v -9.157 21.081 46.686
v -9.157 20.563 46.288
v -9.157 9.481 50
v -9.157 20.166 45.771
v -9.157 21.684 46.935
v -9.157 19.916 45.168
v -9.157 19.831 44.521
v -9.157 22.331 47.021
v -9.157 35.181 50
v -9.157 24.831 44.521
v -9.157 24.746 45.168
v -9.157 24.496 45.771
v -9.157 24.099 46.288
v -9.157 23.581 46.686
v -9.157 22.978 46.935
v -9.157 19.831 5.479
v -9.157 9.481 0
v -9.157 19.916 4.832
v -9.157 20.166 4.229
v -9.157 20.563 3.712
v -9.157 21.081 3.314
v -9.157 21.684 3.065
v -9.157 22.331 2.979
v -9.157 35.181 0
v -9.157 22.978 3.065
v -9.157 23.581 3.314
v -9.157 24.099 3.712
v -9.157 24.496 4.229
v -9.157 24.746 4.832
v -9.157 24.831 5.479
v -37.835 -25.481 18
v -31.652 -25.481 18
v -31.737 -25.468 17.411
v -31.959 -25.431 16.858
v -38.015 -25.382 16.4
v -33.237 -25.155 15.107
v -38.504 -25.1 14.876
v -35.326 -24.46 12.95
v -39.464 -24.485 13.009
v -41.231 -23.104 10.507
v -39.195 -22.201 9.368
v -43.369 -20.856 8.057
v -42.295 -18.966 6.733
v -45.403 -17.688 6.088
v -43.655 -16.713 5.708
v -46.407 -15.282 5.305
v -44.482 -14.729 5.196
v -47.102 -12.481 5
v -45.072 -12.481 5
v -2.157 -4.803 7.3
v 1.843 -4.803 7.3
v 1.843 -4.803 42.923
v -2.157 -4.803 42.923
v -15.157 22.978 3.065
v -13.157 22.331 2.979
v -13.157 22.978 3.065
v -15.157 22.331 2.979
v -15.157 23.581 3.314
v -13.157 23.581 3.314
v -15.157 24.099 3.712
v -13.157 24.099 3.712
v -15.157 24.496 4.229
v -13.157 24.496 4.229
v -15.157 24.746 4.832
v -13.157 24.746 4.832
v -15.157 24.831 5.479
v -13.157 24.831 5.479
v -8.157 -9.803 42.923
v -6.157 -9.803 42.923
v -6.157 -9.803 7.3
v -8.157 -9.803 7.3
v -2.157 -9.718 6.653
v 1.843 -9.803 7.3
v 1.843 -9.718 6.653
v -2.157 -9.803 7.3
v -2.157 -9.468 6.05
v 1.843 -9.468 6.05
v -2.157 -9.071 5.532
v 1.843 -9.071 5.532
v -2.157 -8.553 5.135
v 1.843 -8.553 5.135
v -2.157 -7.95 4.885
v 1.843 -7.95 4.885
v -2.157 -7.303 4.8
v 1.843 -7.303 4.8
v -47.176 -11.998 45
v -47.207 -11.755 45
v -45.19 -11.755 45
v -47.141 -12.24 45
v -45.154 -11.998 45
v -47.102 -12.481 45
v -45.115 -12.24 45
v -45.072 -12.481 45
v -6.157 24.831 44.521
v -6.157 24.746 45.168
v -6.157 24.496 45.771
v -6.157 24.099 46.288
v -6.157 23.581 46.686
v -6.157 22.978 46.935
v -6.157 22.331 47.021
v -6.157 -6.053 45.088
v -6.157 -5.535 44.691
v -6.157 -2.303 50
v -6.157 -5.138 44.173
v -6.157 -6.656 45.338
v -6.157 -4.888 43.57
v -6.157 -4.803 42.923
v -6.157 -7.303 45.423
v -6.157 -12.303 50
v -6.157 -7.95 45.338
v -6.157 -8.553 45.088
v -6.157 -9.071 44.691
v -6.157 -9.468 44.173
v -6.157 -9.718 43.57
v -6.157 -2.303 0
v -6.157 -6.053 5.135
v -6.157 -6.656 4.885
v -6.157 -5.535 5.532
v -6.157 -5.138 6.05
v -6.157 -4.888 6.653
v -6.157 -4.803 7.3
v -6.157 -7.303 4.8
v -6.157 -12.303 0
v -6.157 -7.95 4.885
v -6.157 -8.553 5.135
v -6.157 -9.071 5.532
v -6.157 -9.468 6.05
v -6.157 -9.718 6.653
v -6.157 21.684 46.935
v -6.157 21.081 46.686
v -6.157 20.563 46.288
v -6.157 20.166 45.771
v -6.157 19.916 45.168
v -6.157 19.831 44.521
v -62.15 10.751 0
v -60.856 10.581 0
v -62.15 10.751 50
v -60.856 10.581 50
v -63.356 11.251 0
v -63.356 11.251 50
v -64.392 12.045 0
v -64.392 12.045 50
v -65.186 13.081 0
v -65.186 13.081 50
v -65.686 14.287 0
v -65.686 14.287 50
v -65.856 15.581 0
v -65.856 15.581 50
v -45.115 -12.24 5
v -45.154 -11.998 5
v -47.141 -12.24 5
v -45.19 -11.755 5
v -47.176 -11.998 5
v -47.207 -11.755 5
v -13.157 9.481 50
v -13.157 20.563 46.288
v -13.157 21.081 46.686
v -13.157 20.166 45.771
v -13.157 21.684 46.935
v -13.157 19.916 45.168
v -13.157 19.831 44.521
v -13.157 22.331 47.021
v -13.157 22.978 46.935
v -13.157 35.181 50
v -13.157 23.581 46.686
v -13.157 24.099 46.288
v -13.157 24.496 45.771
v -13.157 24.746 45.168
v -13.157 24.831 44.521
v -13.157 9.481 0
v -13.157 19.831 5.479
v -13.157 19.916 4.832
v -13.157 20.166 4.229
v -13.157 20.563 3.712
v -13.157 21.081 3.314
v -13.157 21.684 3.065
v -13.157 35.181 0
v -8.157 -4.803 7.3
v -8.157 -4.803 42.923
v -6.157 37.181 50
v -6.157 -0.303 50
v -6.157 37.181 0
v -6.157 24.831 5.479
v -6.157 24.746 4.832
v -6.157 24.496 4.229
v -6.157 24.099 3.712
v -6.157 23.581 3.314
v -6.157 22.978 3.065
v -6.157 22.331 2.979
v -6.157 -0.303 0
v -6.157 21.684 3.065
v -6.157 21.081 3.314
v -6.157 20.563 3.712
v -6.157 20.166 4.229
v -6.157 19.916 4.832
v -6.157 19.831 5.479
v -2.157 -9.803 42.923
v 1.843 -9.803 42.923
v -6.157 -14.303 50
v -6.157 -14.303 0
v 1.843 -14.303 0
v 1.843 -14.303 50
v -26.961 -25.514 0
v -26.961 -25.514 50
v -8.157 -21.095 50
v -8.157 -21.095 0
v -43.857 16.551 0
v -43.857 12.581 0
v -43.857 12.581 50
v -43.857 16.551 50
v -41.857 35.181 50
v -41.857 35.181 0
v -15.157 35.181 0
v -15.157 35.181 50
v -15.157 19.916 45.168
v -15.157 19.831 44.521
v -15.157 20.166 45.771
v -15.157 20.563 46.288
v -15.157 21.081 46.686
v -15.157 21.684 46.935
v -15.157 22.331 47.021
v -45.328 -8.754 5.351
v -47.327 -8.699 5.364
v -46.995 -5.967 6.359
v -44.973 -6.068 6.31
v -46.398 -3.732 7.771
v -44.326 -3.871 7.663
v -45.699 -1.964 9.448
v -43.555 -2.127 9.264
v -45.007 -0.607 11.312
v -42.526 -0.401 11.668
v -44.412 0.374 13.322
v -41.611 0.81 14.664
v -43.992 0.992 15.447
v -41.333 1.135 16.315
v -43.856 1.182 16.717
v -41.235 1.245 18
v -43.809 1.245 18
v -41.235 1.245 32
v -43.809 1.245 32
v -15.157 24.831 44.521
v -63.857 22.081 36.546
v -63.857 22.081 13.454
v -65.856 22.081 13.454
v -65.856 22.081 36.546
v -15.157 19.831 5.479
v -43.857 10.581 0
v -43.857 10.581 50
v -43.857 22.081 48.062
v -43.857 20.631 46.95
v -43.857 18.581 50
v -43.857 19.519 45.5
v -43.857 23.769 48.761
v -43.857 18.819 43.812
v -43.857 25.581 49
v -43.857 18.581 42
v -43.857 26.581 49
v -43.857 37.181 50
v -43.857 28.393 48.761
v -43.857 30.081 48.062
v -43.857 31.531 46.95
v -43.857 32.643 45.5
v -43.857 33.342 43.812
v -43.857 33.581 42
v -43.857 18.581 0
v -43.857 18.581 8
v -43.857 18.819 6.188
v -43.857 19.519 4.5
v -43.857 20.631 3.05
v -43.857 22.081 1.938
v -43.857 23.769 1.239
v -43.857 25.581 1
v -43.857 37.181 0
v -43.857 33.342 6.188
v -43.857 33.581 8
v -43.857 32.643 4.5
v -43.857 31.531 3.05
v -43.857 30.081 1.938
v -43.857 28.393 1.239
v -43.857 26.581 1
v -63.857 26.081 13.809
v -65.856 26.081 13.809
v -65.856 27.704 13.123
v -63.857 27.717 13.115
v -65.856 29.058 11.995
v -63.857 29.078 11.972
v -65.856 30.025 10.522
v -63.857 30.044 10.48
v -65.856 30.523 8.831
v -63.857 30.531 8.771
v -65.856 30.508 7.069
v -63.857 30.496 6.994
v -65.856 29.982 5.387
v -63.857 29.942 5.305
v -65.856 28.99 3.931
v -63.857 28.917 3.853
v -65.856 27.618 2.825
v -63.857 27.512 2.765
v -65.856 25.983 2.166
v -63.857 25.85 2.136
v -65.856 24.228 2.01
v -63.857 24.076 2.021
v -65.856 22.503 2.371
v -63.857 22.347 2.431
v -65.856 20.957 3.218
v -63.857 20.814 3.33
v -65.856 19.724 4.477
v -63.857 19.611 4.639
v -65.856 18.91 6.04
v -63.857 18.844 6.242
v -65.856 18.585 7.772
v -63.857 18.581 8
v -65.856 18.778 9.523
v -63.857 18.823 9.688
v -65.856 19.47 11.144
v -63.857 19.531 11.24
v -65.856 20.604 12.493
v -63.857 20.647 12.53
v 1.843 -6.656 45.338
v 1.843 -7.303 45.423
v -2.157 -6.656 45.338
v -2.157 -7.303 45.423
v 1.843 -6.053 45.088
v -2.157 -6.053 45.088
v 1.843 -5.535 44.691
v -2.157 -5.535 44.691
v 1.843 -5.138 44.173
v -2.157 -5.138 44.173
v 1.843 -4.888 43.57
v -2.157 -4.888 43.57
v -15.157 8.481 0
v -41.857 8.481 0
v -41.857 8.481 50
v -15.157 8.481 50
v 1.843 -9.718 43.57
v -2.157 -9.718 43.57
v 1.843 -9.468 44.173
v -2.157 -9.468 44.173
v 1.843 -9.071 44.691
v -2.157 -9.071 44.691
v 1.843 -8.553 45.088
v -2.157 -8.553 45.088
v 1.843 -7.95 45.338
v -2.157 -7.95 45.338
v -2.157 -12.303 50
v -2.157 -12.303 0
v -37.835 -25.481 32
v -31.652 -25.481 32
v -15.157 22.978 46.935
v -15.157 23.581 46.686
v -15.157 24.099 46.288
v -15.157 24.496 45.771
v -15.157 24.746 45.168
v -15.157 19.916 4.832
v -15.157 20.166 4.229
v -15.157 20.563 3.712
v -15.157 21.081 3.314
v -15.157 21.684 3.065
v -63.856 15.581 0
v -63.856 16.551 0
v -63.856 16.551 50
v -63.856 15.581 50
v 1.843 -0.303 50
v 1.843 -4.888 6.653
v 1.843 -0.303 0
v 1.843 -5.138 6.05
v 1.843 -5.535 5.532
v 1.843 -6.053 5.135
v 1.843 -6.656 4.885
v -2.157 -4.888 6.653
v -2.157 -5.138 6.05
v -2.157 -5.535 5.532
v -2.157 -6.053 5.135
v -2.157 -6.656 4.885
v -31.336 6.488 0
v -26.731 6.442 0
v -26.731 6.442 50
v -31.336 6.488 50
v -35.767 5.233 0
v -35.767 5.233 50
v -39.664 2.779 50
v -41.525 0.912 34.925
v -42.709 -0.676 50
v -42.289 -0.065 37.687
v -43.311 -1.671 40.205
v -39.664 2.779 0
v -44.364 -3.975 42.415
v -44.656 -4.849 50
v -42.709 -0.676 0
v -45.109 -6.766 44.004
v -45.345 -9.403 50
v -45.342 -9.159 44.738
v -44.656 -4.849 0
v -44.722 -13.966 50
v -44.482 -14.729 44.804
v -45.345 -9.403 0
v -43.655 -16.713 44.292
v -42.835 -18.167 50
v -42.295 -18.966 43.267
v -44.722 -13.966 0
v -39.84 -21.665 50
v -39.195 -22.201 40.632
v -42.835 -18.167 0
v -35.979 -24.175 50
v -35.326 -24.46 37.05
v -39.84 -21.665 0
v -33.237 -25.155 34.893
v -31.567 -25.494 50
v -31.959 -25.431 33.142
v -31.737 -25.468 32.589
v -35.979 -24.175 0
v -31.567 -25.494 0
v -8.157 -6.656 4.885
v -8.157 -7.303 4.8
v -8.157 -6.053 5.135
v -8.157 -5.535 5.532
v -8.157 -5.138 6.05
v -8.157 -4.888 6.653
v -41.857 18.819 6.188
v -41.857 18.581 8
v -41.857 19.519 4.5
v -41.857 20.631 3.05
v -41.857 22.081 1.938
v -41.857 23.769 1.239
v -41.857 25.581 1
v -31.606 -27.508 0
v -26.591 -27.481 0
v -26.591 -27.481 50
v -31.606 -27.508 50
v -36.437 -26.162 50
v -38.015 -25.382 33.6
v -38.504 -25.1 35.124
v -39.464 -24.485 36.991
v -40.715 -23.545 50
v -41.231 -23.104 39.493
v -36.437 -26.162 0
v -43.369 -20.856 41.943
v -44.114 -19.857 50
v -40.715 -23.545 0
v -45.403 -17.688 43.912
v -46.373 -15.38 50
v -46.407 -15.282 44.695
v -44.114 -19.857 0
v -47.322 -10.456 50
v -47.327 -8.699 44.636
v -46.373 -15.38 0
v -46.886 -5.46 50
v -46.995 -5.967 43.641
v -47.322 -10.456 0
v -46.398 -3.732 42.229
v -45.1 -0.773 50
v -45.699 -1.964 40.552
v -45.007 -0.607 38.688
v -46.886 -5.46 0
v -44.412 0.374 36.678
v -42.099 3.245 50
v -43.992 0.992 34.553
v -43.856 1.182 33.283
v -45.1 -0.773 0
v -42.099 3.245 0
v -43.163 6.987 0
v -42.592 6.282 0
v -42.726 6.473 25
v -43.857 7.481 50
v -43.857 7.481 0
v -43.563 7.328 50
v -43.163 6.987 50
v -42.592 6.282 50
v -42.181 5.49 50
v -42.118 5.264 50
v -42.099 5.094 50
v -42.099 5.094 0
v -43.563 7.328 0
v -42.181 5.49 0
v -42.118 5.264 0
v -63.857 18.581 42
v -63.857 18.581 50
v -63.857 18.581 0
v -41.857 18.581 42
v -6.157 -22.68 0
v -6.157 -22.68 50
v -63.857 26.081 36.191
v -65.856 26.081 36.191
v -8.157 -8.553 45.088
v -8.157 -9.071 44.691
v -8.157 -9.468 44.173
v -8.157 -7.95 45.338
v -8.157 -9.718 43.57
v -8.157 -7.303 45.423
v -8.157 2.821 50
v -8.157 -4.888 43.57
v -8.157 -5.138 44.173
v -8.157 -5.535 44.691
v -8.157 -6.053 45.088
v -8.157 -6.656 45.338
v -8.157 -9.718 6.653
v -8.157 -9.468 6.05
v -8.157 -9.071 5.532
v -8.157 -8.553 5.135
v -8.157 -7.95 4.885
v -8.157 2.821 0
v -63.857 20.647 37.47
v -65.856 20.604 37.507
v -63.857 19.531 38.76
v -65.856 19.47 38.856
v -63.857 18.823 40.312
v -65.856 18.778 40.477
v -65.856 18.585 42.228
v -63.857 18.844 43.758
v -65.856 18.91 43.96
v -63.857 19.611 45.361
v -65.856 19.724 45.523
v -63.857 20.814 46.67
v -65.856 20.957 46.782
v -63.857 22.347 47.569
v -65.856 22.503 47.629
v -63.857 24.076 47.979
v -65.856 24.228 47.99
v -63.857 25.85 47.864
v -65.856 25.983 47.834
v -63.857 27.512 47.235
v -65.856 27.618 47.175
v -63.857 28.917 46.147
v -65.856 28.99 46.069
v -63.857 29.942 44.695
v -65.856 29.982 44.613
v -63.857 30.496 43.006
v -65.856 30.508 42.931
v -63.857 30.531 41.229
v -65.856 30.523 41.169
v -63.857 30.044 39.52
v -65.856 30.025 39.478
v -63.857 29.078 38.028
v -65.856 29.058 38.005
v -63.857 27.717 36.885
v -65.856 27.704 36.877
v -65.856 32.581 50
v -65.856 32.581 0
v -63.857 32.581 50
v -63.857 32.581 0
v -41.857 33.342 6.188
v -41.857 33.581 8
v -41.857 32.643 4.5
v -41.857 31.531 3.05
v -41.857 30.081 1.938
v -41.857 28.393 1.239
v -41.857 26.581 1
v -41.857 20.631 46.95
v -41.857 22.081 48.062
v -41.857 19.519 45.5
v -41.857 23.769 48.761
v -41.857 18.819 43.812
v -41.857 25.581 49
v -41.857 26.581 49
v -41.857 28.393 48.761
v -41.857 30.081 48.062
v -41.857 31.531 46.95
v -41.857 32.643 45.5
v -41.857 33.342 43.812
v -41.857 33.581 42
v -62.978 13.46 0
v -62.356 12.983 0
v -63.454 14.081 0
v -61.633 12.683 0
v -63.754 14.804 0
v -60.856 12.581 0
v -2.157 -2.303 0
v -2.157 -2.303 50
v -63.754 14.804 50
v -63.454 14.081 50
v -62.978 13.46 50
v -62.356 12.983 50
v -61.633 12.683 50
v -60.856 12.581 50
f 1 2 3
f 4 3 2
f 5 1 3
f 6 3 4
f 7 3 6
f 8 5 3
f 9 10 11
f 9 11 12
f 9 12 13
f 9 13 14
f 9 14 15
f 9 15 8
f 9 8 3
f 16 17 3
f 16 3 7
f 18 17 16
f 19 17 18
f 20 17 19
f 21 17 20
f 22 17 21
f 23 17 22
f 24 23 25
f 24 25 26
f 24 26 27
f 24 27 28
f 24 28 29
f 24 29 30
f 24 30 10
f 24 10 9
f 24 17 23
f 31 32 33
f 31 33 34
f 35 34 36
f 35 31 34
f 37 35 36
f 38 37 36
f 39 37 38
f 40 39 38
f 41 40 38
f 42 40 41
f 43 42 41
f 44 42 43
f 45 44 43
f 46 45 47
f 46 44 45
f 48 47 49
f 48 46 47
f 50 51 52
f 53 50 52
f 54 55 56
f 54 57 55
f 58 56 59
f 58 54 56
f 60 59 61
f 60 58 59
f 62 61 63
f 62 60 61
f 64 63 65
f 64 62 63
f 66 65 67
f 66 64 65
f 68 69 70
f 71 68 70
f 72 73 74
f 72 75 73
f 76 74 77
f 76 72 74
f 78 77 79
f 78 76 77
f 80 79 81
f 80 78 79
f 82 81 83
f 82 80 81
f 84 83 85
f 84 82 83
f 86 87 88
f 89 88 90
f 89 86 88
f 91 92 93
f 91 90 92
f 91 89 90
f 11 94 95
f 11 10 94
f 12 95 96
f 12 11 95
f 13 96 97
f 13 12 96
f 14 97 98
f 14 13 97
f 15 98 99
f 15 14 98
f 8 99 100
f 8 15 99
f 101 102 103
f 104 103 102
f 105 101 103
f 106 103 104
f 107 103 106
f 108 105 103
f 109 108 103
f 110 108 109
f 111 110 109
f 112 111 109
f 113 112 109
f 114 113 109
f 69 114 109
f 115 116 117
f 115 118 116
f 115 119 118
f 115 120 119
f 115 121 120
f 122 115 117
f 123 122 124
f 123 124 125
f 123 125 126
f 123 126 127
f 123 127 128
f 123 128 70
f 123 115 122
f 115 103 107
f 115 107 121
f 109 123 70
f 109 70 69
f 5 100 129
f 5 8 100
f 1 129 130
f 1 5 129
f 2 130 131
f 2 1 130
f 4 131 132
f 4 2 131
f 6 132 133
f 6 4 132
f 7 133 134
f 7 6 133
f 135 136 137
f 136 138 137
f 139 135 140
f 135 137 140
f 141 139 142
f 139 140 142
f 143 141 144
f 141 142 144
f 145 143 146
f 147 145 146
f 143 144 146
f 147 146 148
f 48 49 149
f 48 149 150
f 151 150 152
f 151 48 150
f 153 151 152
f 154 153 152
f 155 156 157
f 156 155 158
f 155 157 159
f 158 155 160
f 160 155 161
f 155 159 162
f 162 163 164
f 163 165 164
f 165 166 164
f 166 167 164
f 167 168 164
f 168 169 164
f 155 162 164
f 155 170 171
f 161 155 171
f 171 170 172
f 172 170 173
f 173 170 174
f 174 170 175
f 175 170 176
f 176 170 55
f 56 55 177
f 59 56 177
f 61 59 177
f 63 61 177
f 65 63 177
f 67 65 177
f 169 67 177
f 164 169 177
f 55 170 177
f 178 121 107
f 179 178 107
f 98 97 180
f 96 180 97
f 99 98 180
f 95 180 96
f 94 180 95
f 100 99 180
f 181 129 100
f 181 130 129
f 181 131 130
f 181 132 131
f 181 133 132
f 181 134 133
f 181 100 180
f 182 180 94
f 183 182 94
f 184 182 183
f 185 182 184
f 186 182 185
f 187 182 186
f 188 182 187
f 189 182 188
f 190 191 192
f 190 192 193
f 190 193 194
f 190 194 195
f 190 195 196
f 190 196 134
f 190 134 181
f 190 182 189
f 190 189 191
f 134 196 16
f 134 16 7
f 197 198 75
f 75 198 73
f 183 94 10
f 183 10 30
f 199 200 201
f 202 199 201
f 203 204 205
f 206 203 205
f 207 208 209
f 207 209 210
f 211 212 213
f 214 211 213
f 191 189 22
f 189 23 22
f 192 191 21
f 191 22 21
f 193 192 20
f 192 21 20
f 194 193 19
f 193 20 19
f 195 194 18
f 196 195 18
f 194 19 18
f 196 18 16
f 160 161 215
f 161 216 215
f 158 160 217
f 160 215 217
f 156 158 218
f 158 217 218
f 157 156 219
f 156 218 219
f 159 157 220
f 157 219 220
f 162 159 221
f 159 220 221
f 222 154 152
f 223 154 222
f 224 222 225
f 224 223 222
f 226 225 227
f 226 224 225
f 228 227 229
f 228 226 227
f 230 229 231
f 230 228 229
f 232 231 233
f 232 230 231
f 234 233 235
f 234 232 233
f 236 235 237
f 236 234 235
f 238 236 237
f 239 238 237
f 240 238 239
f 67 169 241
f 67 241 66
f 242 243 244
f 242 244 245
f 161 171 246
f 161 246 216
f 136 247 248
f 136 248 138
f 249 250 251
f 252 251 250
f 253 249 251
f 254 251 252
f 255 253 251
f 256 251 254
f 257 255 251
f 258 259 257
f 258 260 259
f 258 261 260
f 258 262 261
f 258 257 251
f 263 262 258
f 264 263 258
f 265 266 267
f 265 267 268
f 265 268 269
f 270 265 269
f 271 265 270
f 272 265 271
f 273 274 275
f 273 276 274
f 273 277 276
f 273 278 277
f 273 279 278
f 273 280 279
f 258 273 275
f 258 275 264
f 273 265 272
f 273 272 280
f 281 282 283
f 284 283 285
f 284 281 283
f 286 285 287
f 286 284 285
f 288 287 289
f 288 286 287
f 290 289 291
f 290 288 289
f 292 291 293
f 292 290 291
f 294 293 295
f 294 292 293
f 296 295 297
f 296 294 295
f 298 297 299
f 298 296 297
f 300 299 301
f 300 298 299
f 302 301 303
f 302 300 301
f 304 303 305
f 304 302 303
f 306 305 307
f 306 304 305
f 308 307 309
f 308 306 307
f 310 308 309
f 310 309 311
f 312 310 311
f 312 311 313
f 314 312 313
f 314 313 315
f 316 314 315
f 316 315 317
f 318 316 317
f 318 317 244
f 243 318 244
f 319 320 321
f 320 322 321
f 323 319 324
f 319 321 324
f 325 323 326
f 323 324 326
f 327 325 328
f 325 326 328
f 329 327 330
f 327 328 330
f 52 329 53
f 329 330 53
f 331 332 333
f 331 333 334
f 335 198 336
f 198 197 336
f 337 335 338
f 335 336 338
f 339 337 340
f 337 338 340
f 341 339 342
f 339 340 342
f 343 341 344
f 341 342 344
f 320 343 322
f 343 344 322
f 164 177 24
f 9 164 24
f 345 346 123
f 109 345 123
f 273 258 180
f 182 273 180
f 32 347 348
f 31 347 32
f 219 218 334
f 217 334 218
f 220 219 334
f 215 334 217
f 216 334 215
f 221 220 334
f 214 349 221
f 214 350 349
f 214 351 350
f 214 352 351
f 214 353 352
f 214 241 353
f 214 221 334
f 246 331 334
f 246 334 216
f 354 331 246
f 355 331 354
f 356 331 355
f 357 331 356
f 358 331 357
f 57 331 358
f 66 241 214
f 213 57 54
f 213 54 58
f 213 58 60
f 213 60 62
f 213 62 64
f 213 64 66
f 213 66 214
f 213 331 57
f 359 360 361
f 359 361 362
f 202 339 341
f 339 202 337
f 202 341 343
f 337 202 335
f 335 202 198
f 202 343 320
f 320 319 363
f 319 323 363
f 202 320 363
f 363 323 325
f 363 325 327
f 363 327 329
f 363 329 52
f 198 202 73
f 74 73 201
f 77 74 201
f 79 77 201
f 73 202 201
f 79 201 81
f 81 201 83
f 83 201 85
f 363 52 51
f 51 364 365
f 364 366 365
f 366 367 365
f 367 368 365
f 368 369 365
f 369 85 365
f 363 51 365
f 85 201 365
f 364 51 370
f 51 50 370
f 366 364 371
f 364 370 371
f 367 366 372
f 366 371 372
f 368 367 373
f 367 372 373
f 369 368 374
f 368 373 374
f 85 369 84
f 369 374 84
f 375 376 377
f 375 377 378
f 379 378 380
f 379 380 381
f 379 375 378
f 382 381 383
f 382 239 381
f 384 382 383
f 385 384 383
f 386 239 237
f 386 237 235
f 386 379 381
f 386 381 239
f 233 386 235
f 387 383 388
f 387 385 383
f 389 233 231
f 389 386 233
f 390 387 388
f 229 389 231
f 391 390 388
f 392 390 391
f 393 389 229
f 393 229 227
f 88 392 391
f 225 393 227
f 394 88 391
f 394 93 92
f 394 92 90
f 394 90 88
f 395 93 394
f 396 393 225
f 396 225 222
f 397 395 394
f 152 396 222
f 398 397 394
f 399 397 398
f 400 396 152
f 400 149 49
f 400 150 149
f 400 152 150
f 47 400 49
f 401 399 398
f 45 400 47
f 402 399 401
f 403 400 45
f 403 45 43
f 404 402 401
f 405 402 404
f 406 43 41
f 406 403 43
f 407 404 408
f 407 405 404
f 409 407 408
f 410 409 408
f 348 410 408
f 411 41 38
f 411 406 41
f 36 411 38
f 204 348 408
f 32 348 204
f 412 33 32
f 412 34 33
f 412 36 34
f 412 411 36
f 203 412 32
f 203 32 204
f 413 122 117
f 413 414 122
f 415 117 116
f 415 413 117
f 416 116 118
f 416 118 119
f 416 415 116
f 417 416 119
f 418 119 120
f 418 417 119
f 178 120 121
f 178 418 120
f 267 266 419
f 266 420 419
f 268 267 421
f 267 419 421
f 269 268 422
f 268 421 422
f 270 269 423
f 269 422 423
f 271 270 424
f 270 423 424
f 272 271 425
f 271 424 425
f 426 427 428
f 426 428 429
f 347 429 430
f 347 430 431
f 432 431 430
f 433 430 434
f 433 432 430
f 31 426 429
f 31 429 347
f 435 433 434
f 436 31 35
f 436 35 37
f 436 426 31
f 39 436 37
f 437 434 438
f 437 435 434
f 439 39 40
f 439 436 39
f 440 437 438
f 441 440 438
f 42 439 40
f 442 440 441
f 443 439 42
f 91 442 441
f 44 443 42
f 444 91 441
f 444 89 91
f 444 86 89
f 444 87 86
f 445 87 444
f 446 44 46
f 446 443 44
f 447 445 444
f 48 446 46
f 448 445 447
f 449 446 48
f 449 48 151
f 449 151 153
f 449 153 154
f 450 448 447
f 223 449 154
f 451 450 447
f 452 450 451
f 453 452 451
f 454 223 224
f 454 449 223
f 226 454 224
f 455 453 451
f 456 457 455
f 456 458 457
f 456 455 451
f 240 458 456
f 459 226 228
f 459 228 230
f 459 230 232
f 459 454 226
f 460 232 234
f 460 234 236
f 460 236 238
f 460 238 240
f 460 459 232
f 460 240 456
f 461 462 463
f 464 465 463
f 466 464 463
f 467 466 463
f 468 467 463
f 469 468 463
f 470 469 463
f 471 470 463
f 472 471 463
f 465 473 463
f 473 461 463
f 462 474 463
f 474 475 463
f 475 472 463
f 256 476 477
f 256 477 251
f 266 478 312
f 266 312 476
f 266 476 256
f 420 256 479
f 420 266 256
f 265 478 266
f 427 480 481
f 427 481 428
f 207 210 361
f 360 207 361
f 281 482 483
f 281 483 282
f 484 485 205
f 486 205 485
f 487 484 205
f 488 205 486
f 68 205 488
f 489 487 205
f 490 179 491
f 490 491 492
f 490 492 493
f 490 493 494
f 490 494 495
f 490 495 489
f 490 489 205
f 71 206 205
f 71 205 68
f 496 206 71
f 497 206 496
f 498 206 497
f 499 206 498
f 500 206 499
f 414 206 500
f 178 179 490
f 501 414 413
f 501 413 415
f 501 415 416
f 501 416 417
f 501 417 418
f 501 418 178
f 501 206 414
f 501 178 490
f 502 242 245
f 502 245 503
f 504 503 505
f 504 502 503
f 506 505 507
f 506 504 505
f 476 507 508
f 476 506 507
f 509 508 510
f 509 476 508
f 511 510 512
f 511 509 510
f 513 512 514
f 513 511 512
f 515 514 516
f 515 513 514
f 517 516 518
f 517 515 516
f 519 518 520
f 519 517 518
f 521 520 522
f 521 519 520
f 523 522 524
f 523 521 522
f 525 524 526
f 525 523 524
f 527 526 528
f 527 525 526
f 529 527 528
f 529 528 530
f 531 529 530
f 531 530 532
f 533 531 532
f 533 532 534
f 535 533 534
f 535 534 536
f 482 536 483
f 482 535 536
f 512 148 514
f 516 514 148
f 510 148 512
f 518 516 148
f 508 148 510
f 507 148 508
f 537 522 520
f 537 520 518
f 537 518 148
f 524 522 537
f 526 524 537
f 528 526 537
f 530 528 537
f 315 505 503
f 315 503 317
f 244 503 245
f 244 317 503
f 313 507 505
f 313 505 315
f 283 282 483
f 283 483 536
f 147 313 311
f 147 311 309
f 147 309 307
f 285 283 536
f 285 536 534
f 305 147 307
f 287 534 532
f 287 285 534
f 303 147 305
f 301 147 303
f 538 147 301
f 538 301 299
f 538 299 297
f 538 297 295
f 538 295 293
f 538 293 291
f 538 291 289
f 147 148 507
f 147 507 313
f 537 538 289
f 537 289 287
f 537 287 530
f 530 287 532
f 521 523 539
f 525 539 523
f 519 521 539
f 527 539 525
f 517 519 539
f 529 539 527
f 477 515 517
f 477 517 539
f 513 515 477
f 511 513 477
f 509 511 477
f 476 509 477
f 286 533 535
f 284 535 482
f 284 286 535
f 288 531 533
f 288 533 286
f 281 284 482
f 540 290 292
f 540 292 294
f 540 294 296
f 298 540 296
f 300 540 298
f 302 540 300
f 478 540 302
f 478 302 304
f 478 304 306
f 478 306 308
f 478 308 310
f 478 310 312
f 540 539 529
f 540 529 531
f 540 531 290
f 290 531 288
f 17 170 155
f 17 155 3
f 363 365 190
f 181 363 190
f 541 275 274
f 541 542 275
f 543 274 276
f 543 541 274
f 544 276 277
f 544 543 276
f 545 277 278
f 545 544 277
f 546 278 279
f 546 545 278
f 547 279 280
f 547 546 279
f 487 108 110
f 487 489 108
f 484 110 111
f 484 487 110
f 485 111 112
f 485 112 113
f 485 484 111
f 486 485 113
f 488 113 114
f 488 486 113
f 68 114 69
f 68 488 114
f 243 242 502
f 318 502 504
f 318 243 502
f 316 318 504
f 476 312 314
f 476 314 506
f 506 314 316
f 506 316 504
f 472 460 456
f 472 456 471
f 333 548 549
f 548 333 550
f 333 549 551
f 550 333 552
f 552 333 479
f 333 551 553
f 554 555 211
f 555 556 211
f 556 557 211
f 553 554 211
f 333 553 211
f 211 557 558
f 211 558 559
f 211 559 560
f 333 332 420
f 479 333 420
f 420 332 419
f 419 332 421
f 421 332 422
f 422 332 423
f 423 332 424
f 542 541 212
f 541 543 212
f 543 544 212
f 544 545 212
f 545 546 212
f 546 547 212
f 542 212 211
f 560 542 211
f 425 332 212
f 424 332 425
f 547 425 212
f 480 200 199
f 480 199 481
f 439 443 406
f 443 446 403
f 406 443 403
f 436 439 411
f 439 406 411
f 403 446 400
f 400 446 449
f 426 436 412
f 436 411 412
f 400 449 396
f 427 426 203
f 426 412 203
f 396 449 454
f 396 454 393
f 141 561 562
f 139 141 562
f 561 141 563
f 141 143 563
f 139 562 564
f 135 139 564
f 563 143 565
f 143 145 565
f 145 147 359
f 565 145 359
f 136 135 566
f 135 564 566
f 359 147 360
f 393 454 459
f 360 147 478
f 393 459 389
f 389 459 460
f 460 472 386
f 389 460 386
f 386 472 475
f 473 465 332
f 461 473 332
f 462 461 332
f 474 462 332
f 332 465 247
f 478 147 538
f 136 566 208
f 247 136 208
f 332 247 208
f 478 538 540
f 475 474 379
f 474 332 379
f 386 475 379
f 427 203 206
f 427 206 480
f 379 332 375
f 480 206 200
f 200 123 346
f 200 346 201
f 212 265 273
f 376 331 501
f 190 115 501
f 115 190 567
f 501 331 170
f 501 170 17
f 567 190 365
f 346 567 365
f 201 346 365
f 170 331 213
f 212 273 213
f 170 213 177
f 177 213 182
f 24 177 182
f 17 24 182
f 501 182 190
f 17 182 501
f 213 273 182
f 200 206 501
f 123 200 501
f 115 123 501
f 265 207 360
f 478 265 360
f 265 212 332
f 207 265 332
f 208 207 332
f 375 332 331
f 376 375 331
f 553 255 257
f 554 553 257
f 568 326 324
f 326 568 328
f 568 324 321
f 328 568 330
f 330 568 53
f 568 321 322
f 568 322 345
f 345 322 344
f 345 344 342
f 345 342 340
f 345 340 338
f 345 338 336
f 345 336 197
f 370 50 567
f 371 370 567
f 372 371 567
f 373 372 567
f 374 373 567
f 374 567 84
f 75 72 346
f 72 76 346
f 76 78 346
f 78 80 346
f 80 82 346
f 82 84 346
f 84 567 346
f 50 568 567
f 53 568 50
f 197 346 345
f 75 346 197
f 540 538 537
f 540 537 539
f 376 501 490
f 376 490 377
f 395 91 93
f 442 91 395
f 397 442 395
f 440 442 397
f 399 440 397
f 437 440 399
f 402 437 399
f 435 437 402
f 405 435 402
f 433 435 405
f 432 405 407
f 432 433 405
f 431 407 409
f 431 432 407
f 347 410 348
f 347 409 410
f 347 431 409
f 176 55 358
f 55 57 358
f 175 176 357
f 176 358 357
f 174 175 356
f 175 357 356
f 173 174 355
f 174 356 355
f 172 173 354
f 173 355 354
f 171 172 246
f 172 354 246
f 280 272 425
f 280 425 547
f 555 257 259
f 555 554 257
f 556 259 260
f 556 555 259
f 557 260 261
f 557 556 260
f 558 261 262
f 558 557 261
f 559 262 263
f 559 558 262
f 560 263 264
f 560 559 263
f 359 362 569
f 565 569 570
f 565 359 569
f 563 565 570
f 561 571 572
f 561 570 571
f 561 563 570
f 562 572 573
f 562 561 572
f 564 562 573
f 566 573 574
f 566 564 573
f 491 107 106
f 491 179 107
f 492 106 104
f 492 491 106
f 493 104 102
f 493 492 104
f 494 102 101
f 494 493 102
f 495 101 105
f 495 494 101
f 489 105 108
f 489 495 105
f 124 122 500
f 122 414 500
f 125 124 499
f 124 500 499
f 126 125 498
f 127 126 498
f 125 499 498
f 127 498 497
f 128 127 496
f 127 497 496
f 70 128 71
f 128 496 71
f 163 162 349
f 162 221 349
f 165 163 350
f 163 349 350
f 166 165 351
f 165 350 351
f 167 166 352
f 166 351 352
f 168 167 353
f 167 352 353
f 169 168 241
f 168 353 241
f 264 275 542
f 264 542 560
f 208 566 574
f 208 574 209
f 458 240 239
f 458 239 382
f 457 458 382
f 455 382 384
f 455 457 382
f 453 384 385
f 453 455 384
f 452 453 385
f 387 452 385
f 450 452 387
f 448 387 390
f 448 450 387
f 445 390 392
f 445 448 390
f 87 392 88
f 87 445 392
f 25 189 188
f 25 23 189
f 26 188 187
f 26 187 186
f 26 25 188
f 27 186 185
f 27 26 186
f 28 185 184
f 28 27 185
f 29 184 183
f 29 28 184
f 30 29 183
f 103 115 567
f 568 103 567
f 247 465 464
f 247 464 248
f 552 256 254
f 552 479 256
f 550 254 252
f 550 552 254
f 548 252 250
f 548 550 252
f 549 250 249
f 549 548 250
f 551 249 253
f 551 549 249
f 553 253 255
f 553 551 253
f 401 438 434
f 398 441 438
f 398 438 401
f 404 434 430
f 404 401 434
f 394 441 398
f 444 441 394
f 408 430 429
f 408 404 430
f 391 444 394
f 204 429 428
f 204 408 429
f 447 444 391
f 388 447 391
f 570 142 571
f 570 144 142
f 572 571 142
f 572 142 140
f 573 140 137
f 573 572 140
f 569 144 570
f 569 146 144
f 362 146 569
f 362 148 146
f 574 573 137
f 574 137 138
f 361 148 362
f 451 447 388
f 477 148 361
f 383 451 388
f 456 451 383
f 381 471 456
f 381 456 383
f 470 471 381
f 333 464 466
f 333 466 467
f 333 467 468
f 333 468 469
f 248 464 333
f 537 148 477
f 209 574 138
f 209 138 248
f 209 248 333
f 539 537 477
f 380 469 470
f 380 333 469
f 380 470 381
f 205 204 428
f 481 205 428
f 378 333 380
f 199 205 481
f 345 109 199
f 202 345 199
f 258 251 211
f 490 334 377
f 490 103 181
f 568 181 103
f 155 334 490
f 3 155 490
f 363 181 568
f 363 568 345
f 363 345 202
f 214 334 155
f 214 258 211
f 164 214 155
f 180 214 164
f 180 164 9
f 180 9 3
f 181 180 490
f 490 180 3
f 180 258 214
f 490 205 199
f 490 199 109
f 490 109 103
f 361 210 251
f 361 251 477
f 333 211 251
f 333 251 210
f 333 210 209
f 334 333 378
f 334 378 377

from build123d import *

# Parameters (mm, degrees)
CROQUIS3_W                  = 26.7
CROQUIS3_H                  = 26.7
CROQUIS3_W_2                = 4
CROQUIS3_H_2                = 25.7
CROQUIS3_W_3                = 13.5
CROQUIS3_H_3                = 3.969798642
SALIENTE_EXTRUIR1_DEPTH     = 50
SALIENTE_EXTRUIR2_DEPTH     = 50
CORTAR_EXTRUIR12_REACH      = 94.009
CORTAR_EXTRUIR13_REACH      = 79.272
CROQUIS13_W                 = 48
CROQUIS13_H                 = 15
REDONDEO1_R                 = 2.5
CORTAR_EXTRUIR14_REACH      = 88.292
REDONDEO2_R                 = 2.5
CORTAR_EXTRUIR15_REACH      = 92.548
REDONDEO3_R                 = 5
REDONDEO4_DEPTH             = 50
CORTAR_EXTRUIR17_REACH      = 81.89
CORTAR_EXTRUIR17_END_RADIUS = 16.15
REDONDEO5_R                 = 7
CORTAR_EXTRUIR18_REACH      = 92.661


with BuildPart() as part:
    # Croquis3 → Saliente-Extruir1 (new body)
    with BuildSketch(Plane.XY):
        with BuildLine():
            Line((-63.857247249, 32.580922569), (-63.857247249, 18.580922369))
            Line((-63.857247249, 18.580922369), (-43.857247249, 18.580922369))
            Line((-43.857247249, 18.580922369), (-43.857247249, 37.180922369))
            Line((-43.857247249, 37.180922369), (-27.007247249, 37.180922369))
            Line((-27.007247249, 37.180922369), (-6.157247249, 37.180922369))
            Line((-6.157247249, 37.180922369), (-6.157247249, -22.679560551))
            Line((-6.157247249, -22.679560551), (-26.590955846, -27.481197975))
            ThreePointArc((-26.590955846, -27.481197975), (-45.398833914, -17.697170572), (-42.099195701, 3.245032209))
            Line((-42.099195701, 3.245032209), (-42.099195701, 7.480922369))
            Line((-42.099195701, 7.480922369), (-43.857247249, 7.480922369))
            Line((-43.857247249, 7.480922369), (-43.857247249, 10.580922369))
            Line((-43.857247249, 10.580922369), (-65.856221771, 10.580922369))
            Line((-65.856221771, 10.580922369), (-65.856221771, 16.580922369))
            Line((-65.856221771, 16.580922369), (-65.856221771, 32.580922569))
            Line((-65.856221771, 32.580922569), (-63.857247249, 32.580922569))
        make_face()
        with Locations((-28.507247249, 21.830922369)):
            Rectangle(CROQUIS3_W, CROQUIS3_H, mode=Mode.SUBTRACT)
        with Locations((-11.157247249, 22.330922369)):
            Rectangle(CROQUIS3_W_2, CROQUIS3_H_2, mode=Mode.SUBTRACT)
        with Locations((-50.607247249, 14.56582169)):
            Rectangle(CROQUIS3_W_3, CROQUIS3_H_3, mode=Mode.SUBTRACT)
        with BuildLine():
            Line((-8.157247249, 2.82108494), (-26.731262437, 6.441781026))
            ThreePointArc((-26.731262437, 6.441781026), (-45.345288804, -9.402744466), (-26.961453667, -25.513783269))
            Line((-26.961453667, -25.513783269), (-8.157247249, -21.095056202))
            Line((-8.157247249, -21.095056202), (-8.157247249, 2.82108494))
        make_face(mode=Mode.SUBTRACT)
    extrude(amount=SALIENTE_EXTRUIR1_DEPTH)

    # Croquis11 → Saliente-Extruir2 (add)
    with BuildSketch(Plane(origin=(0, 0, 0), x_dir=(-1, 0, 0), z_dir=(0, 0, -1))):
        Polygon((-1.842752751, -14.302804028), (-1.842752751, -0.302804028), (6.157247249, -0.302804028), (6.157247249, -2.302804028), (2.157247249, -2.302804028), (2.157247249, -12.302804028), (6.157247249, -12.302804028), (6.157247249, -14.302804028), align=None)
    extrude(amount=-SALIENTE_EXTRUIR2_DEPTH)

    # Cortar-Extruir12: up to this face of the body (flat: up to its plane)
    cortar_extruir12_end = Plane(part.part.faces().sort_by_distance((-8.157247249, -9.136985631, 25))[0])
    # Croquis12 → Cortar-Extruir12 (cut, up to the picked face)
    with BuildSketch(Plane(origin=(1.842752751, 0, 0), x_dir=(0, 0, -1), z_dir=(1, 0, 0)), mode=Mode.PRIVATE) as cortar_extruir12_sk1:
        Polygon((-25, -9.802804028), (-4.8, -9.802804028), (-4.8, -4.802804028), (-45.42287301, -4.802804028), (-45.42287301, -9.802804028), align=None)
    cortar_extruir12_tool1 = split(extrude(cortar_extruir12_sk1.sketch, amount=-CORTAR_EXTRUIR12_REACH, mode=Mode.PRIVATE), bisect_by=cortar_extruir12_end, keep=Keep.BOTH, mode=Mode.PRIVATE)
    add(cortar_extruir12_tool1.solids().sort_by(Axis((1.842753, -7.302804, 25.111437), (-1, 0, 0)))[0], mode=Mode.SUBTRACT)

    # Croquis13 → Cortar-Extruir13 (cut, up to next)
    with BuildSketch(Plane.ZY.offset(43.857247249), mode=Mode.PRIVATE) as cortar_extruir13_sk1:
        with Locations((25, 26.080922369)):
            Rectangle(CROQUIS13_W, CROQUIS13_H)
    cortar_extruir13_tool1 = extrude(cortar_extruir13_sk1.sketch, amount=-CORTAR_EXTRUIR13_REACH, mode=Mode.PRIVATE) & part.part
    add(cortar_extruir13_tool1.solids().sort_by_distance((-43.857247, 26.080922, 25))[0], mode=Mode.SUBTRACT)

    # Redondeo1
    redondeo1_edges = [part.edges().sort_by_distance(p)[0] for p in [
        (-0.157247249, -4.802804028, 4.8),
        (-0.157247249, -9.802804028, 4.8),
        (-0.157247249, -9.802804028, 45.42287301),
        (-0.157247249, -4.802804028, 45.42287301),
        (-7.157247249, -9.802804028, 4.8),
        (-7.157247249, -4.802804028, 4.8),
        (-7.157247249, -9.802804028, 45.42287301),
        (-7.157247249, -4.802804028, 45.42287301),
    ]]
    fillet(redondeo1_edges, radius=REDONDEO1_R - 0.0001)  # a hair under: the kernel refuses the full size

    # Cortar-Extruir14: up to this face of the body (flat: up to its plane)
    cortar_extruir14_end = Plane(part.part.faces().sort_by_distance((-15.157247249, 21.830922369, 25))[0])
    # Croquis14 → Cortar-Extruir14 (cut, up to the picked face)
    with BuildSketch(Plane(origin=(-6.157247249, 0, 0), x_dir=(0, 0, -1), z_dir=(1, 0, 0)), mode=Mode.PRIVATE) as cortar_extruir14_sk1:
        Polygon((-2.979356026, 22.330922369), (-2.979356026, 19.830922369), (-47.020643974, 19.830922369), (-47.020643974, 22.330922369), (-47.020643974, 24.830922369), (-2.979356026, 24.830922369), align=None)
    cortar_extruir14_tool1 = split(extrude(cortar_extruir14_sk1.sketch, amount=-CORTAR_EXTRUIR14_REACH, mode=Mode.PRIVATE), bisect_by=cortar_extruir14_end, keep=Keep.BOTH, mode=Mode.PRIVATE)
    add(cortar_extruir14_tool1.solids().sort_by(Axis((-6.157247, 22.330922, 25), (-1, 0, 0)))[0], mode=Mode.SUBTRACT)

    # Redondeo2
    redondeo2_edges = [part.edges().sort_by_distance(p)[0] for p in [
        (-14.157247249, 24.830922369, 2.979356026),
        (-7.657247249, 24.830922369, 2.979356026),
        (-7.657247249, 19.830922369, 2.979356026),
        (-14.157247249, 19.830922369, 2.979356026),
        (-14.157247249, 24.830922369, 47.020643974),
        (-7.657247249, 24.830922369, 47.020643974),
        (-7.657247249, 19.830922369, 47.020643974),
        (-14.157247249, 19.830922369, 47.020643974),
    ]]
    fillet(redondeo2_edges, radius=REDONDEO2_R - 0.0001)  # a hair under: the kernel refuses the full size

    # Croquis15 → Cortar-Extruir15 (cut, up to next)
    with BuildSketch(Plane(origin=(-63.857247249, 0, 0), x_dir=(0, 0, -1), z_dir=(1, 0, 0)), mode=Mode.PRIVATE) as cortar_extruir15_sk1:
        with BuildLine():
            Line((-31, 26.080922569), (-19, 26.080922569))
            Line((-19, 26.080922569), (-13.809474968, 26.080922569))
            ThreePointArc((-13.809474968, 26.080922569), (-2.023506642, 25.111513684), (-13.454356149, 22.080922569))
            Line((-13.454356149, 22.080922569), (-19, 22.080922569))
            Line((-19, 22.080922569), (-31, 22.080922569))
            Line((-31, 22.080922569), (-36.545643851, 22.080922569))
            ThreePointArc((-36.545643851, 22.080922569), (-47.976493358, 25.111513684), (-36.190525032, 26.080922569))
            Line((-36.190525032, 26.080922569), (-31, 26.080922569))
        make_face()
    cortar_extruir15_tool1 = extrude(cortar_extruir15_sk1.sketch, amount=-CORTAR_EXTRUIR15_REACH, mode=Mode.PRIVATE) & part.part
    add(cortar_extruir15_tool1.solids().sort_by_distance((-63.857247, 24.436716, 25))[0], mode=Mode.SUBTRACT)

    # Redondeo3
    redondeo3_edges = [part.edges().sort_by_distance(p)[0] for p in [
        (-65.856221771, 10.580922369, 25),
    ]]
    fillet(redondeo3_edges, radius=REDONDEO3_R)

    # Redondeo4: read off the stored shape, not the designer's step
    # Redondeo4 outline → Redondeo4 (add)
    with BuildSketch(Plane.XY):
        with BuildLine():
            Line((-42.099195701, 7.480922369), (-43.857247249, 7.480922369))
            add(Edge.make_bspline(
                [(-43.857247249, 7.480922369), (-42.099195701, 6.934552825), (-42.099195701, 5.093557191)],
                knots=[0, 0, 0, 1, 1, 1], degree=2, weights=[1, 0.402613242, 1]))
            Line((-42.099195701, 5.093557191), (-42.099195701, 7.480922369))
        make_face()
    extrude(amount=REDONDEO4_DEPTH)

    # Cortar-Extruir17: up to this cylinder (the profile starts outside it)
    cortar_extruir17_end = Plane(origin=(-29.1957078, -9.519077631, 25), z_dir=(0, 0, -1)) * Cylinder(CORTAR_EXTRUIR17_END_RADIUS, 197.08, mode=Mode.PRIVATE)
    # Croquis16 → Cortar-Extruir17 (cut, up to the surface)
    with BuildSketch(Plane.ZY.offset(48.157247249), mode=Mode.PRIVATE) as cortar_extruir17_sk1:
        with BuildLine():
            Line((32, -25.481197975), (18, -25.481197975))
            ThreePointArc((18, -25.481197975), (8.807611845, -21.67358613), (5, -12.481197975))
            Line((5, -12.481197975), (5, -11.754967791))
            ThreePointArc((5, -11.754967791), (8.807611845, -2.562579636), (18, 1.245032209))
            Line((18, 1.245032209), (32, 1.245032209))
            ThreePointArc((32, 1.245032209), (41.192388155, -2.562579636), (45, -11.754967791))
            Line((45, -11.754967791), (45, -12.481197975))
            ThreePointArc((45, -12.481197975), (41.192388155, -21.67358613), (32, -25.481197975))
        make_face()
    cortar_extruir17_tool1 = extrude(cortar_extruir17_sk1.sketch, amount=-CORTAR_EXTRUIR17_REACH, mode=Mode.PRIVATE) - cortar_extruir17_end
    add(cortar_extruir17_tool1.solids().sort_by_distance((-48.157247, -12.118083, 25))[0], mode=Mode.SUBTRACT)

    # Redondeo5
    redondeo5_edges = [part.edges().sort_by_distance(p)[0] for p in [
        (-42.857247249, 18.580922369, 1),
        (-42.857247249, 33.580922369, 1),
        (-42.857247249, 33.580922369, 49),
        (-42.857247249, 18.580922369, 49),
    ]]
    fillet(redondeo5_edges, radius=REDONDEO5_R)

    # Croquis17 → Cortar-Extruir18 (cut, up to next)
    with BuildSketch(Plane(origin=(0, 0, 0), x_dir=(-1, 0, 0), z_dir=(0, 0, -1)), mode=Mode.PRIVATE) as cortar_extruir18_sk1:
        with BuildLine():
            Line((60.856221771, 12.580922369), (57.357247249, 12.580922369))
            Line((57.357247249, 12.580922369), (57.357247249, 16.550721011))
            Line((57.357247249, 16.550721011), (63.856221771, 16.550721011))
            Line((63.856221771, 16.550721011), (63.856221771, 15.580922369))
            ThreePointArc((63.856221771, 15.580922369), (62.977542115, 13.459602026), (60.856221771, 12.580922369))
        make_face()
    cortar_extruir18_tool1 = extrude(cortar_extruir18_sk1.sketch, amount=-CORTAR_EXTRUIR18_REACH, mode=Mode.PRIVATE) & part.part
    add(cortar_extruir18_tool1.solids().sort_by_distance((-60.398011, 14.672215, 0))[0], mode=Mode.SUBTRACT)


solid = part.part
